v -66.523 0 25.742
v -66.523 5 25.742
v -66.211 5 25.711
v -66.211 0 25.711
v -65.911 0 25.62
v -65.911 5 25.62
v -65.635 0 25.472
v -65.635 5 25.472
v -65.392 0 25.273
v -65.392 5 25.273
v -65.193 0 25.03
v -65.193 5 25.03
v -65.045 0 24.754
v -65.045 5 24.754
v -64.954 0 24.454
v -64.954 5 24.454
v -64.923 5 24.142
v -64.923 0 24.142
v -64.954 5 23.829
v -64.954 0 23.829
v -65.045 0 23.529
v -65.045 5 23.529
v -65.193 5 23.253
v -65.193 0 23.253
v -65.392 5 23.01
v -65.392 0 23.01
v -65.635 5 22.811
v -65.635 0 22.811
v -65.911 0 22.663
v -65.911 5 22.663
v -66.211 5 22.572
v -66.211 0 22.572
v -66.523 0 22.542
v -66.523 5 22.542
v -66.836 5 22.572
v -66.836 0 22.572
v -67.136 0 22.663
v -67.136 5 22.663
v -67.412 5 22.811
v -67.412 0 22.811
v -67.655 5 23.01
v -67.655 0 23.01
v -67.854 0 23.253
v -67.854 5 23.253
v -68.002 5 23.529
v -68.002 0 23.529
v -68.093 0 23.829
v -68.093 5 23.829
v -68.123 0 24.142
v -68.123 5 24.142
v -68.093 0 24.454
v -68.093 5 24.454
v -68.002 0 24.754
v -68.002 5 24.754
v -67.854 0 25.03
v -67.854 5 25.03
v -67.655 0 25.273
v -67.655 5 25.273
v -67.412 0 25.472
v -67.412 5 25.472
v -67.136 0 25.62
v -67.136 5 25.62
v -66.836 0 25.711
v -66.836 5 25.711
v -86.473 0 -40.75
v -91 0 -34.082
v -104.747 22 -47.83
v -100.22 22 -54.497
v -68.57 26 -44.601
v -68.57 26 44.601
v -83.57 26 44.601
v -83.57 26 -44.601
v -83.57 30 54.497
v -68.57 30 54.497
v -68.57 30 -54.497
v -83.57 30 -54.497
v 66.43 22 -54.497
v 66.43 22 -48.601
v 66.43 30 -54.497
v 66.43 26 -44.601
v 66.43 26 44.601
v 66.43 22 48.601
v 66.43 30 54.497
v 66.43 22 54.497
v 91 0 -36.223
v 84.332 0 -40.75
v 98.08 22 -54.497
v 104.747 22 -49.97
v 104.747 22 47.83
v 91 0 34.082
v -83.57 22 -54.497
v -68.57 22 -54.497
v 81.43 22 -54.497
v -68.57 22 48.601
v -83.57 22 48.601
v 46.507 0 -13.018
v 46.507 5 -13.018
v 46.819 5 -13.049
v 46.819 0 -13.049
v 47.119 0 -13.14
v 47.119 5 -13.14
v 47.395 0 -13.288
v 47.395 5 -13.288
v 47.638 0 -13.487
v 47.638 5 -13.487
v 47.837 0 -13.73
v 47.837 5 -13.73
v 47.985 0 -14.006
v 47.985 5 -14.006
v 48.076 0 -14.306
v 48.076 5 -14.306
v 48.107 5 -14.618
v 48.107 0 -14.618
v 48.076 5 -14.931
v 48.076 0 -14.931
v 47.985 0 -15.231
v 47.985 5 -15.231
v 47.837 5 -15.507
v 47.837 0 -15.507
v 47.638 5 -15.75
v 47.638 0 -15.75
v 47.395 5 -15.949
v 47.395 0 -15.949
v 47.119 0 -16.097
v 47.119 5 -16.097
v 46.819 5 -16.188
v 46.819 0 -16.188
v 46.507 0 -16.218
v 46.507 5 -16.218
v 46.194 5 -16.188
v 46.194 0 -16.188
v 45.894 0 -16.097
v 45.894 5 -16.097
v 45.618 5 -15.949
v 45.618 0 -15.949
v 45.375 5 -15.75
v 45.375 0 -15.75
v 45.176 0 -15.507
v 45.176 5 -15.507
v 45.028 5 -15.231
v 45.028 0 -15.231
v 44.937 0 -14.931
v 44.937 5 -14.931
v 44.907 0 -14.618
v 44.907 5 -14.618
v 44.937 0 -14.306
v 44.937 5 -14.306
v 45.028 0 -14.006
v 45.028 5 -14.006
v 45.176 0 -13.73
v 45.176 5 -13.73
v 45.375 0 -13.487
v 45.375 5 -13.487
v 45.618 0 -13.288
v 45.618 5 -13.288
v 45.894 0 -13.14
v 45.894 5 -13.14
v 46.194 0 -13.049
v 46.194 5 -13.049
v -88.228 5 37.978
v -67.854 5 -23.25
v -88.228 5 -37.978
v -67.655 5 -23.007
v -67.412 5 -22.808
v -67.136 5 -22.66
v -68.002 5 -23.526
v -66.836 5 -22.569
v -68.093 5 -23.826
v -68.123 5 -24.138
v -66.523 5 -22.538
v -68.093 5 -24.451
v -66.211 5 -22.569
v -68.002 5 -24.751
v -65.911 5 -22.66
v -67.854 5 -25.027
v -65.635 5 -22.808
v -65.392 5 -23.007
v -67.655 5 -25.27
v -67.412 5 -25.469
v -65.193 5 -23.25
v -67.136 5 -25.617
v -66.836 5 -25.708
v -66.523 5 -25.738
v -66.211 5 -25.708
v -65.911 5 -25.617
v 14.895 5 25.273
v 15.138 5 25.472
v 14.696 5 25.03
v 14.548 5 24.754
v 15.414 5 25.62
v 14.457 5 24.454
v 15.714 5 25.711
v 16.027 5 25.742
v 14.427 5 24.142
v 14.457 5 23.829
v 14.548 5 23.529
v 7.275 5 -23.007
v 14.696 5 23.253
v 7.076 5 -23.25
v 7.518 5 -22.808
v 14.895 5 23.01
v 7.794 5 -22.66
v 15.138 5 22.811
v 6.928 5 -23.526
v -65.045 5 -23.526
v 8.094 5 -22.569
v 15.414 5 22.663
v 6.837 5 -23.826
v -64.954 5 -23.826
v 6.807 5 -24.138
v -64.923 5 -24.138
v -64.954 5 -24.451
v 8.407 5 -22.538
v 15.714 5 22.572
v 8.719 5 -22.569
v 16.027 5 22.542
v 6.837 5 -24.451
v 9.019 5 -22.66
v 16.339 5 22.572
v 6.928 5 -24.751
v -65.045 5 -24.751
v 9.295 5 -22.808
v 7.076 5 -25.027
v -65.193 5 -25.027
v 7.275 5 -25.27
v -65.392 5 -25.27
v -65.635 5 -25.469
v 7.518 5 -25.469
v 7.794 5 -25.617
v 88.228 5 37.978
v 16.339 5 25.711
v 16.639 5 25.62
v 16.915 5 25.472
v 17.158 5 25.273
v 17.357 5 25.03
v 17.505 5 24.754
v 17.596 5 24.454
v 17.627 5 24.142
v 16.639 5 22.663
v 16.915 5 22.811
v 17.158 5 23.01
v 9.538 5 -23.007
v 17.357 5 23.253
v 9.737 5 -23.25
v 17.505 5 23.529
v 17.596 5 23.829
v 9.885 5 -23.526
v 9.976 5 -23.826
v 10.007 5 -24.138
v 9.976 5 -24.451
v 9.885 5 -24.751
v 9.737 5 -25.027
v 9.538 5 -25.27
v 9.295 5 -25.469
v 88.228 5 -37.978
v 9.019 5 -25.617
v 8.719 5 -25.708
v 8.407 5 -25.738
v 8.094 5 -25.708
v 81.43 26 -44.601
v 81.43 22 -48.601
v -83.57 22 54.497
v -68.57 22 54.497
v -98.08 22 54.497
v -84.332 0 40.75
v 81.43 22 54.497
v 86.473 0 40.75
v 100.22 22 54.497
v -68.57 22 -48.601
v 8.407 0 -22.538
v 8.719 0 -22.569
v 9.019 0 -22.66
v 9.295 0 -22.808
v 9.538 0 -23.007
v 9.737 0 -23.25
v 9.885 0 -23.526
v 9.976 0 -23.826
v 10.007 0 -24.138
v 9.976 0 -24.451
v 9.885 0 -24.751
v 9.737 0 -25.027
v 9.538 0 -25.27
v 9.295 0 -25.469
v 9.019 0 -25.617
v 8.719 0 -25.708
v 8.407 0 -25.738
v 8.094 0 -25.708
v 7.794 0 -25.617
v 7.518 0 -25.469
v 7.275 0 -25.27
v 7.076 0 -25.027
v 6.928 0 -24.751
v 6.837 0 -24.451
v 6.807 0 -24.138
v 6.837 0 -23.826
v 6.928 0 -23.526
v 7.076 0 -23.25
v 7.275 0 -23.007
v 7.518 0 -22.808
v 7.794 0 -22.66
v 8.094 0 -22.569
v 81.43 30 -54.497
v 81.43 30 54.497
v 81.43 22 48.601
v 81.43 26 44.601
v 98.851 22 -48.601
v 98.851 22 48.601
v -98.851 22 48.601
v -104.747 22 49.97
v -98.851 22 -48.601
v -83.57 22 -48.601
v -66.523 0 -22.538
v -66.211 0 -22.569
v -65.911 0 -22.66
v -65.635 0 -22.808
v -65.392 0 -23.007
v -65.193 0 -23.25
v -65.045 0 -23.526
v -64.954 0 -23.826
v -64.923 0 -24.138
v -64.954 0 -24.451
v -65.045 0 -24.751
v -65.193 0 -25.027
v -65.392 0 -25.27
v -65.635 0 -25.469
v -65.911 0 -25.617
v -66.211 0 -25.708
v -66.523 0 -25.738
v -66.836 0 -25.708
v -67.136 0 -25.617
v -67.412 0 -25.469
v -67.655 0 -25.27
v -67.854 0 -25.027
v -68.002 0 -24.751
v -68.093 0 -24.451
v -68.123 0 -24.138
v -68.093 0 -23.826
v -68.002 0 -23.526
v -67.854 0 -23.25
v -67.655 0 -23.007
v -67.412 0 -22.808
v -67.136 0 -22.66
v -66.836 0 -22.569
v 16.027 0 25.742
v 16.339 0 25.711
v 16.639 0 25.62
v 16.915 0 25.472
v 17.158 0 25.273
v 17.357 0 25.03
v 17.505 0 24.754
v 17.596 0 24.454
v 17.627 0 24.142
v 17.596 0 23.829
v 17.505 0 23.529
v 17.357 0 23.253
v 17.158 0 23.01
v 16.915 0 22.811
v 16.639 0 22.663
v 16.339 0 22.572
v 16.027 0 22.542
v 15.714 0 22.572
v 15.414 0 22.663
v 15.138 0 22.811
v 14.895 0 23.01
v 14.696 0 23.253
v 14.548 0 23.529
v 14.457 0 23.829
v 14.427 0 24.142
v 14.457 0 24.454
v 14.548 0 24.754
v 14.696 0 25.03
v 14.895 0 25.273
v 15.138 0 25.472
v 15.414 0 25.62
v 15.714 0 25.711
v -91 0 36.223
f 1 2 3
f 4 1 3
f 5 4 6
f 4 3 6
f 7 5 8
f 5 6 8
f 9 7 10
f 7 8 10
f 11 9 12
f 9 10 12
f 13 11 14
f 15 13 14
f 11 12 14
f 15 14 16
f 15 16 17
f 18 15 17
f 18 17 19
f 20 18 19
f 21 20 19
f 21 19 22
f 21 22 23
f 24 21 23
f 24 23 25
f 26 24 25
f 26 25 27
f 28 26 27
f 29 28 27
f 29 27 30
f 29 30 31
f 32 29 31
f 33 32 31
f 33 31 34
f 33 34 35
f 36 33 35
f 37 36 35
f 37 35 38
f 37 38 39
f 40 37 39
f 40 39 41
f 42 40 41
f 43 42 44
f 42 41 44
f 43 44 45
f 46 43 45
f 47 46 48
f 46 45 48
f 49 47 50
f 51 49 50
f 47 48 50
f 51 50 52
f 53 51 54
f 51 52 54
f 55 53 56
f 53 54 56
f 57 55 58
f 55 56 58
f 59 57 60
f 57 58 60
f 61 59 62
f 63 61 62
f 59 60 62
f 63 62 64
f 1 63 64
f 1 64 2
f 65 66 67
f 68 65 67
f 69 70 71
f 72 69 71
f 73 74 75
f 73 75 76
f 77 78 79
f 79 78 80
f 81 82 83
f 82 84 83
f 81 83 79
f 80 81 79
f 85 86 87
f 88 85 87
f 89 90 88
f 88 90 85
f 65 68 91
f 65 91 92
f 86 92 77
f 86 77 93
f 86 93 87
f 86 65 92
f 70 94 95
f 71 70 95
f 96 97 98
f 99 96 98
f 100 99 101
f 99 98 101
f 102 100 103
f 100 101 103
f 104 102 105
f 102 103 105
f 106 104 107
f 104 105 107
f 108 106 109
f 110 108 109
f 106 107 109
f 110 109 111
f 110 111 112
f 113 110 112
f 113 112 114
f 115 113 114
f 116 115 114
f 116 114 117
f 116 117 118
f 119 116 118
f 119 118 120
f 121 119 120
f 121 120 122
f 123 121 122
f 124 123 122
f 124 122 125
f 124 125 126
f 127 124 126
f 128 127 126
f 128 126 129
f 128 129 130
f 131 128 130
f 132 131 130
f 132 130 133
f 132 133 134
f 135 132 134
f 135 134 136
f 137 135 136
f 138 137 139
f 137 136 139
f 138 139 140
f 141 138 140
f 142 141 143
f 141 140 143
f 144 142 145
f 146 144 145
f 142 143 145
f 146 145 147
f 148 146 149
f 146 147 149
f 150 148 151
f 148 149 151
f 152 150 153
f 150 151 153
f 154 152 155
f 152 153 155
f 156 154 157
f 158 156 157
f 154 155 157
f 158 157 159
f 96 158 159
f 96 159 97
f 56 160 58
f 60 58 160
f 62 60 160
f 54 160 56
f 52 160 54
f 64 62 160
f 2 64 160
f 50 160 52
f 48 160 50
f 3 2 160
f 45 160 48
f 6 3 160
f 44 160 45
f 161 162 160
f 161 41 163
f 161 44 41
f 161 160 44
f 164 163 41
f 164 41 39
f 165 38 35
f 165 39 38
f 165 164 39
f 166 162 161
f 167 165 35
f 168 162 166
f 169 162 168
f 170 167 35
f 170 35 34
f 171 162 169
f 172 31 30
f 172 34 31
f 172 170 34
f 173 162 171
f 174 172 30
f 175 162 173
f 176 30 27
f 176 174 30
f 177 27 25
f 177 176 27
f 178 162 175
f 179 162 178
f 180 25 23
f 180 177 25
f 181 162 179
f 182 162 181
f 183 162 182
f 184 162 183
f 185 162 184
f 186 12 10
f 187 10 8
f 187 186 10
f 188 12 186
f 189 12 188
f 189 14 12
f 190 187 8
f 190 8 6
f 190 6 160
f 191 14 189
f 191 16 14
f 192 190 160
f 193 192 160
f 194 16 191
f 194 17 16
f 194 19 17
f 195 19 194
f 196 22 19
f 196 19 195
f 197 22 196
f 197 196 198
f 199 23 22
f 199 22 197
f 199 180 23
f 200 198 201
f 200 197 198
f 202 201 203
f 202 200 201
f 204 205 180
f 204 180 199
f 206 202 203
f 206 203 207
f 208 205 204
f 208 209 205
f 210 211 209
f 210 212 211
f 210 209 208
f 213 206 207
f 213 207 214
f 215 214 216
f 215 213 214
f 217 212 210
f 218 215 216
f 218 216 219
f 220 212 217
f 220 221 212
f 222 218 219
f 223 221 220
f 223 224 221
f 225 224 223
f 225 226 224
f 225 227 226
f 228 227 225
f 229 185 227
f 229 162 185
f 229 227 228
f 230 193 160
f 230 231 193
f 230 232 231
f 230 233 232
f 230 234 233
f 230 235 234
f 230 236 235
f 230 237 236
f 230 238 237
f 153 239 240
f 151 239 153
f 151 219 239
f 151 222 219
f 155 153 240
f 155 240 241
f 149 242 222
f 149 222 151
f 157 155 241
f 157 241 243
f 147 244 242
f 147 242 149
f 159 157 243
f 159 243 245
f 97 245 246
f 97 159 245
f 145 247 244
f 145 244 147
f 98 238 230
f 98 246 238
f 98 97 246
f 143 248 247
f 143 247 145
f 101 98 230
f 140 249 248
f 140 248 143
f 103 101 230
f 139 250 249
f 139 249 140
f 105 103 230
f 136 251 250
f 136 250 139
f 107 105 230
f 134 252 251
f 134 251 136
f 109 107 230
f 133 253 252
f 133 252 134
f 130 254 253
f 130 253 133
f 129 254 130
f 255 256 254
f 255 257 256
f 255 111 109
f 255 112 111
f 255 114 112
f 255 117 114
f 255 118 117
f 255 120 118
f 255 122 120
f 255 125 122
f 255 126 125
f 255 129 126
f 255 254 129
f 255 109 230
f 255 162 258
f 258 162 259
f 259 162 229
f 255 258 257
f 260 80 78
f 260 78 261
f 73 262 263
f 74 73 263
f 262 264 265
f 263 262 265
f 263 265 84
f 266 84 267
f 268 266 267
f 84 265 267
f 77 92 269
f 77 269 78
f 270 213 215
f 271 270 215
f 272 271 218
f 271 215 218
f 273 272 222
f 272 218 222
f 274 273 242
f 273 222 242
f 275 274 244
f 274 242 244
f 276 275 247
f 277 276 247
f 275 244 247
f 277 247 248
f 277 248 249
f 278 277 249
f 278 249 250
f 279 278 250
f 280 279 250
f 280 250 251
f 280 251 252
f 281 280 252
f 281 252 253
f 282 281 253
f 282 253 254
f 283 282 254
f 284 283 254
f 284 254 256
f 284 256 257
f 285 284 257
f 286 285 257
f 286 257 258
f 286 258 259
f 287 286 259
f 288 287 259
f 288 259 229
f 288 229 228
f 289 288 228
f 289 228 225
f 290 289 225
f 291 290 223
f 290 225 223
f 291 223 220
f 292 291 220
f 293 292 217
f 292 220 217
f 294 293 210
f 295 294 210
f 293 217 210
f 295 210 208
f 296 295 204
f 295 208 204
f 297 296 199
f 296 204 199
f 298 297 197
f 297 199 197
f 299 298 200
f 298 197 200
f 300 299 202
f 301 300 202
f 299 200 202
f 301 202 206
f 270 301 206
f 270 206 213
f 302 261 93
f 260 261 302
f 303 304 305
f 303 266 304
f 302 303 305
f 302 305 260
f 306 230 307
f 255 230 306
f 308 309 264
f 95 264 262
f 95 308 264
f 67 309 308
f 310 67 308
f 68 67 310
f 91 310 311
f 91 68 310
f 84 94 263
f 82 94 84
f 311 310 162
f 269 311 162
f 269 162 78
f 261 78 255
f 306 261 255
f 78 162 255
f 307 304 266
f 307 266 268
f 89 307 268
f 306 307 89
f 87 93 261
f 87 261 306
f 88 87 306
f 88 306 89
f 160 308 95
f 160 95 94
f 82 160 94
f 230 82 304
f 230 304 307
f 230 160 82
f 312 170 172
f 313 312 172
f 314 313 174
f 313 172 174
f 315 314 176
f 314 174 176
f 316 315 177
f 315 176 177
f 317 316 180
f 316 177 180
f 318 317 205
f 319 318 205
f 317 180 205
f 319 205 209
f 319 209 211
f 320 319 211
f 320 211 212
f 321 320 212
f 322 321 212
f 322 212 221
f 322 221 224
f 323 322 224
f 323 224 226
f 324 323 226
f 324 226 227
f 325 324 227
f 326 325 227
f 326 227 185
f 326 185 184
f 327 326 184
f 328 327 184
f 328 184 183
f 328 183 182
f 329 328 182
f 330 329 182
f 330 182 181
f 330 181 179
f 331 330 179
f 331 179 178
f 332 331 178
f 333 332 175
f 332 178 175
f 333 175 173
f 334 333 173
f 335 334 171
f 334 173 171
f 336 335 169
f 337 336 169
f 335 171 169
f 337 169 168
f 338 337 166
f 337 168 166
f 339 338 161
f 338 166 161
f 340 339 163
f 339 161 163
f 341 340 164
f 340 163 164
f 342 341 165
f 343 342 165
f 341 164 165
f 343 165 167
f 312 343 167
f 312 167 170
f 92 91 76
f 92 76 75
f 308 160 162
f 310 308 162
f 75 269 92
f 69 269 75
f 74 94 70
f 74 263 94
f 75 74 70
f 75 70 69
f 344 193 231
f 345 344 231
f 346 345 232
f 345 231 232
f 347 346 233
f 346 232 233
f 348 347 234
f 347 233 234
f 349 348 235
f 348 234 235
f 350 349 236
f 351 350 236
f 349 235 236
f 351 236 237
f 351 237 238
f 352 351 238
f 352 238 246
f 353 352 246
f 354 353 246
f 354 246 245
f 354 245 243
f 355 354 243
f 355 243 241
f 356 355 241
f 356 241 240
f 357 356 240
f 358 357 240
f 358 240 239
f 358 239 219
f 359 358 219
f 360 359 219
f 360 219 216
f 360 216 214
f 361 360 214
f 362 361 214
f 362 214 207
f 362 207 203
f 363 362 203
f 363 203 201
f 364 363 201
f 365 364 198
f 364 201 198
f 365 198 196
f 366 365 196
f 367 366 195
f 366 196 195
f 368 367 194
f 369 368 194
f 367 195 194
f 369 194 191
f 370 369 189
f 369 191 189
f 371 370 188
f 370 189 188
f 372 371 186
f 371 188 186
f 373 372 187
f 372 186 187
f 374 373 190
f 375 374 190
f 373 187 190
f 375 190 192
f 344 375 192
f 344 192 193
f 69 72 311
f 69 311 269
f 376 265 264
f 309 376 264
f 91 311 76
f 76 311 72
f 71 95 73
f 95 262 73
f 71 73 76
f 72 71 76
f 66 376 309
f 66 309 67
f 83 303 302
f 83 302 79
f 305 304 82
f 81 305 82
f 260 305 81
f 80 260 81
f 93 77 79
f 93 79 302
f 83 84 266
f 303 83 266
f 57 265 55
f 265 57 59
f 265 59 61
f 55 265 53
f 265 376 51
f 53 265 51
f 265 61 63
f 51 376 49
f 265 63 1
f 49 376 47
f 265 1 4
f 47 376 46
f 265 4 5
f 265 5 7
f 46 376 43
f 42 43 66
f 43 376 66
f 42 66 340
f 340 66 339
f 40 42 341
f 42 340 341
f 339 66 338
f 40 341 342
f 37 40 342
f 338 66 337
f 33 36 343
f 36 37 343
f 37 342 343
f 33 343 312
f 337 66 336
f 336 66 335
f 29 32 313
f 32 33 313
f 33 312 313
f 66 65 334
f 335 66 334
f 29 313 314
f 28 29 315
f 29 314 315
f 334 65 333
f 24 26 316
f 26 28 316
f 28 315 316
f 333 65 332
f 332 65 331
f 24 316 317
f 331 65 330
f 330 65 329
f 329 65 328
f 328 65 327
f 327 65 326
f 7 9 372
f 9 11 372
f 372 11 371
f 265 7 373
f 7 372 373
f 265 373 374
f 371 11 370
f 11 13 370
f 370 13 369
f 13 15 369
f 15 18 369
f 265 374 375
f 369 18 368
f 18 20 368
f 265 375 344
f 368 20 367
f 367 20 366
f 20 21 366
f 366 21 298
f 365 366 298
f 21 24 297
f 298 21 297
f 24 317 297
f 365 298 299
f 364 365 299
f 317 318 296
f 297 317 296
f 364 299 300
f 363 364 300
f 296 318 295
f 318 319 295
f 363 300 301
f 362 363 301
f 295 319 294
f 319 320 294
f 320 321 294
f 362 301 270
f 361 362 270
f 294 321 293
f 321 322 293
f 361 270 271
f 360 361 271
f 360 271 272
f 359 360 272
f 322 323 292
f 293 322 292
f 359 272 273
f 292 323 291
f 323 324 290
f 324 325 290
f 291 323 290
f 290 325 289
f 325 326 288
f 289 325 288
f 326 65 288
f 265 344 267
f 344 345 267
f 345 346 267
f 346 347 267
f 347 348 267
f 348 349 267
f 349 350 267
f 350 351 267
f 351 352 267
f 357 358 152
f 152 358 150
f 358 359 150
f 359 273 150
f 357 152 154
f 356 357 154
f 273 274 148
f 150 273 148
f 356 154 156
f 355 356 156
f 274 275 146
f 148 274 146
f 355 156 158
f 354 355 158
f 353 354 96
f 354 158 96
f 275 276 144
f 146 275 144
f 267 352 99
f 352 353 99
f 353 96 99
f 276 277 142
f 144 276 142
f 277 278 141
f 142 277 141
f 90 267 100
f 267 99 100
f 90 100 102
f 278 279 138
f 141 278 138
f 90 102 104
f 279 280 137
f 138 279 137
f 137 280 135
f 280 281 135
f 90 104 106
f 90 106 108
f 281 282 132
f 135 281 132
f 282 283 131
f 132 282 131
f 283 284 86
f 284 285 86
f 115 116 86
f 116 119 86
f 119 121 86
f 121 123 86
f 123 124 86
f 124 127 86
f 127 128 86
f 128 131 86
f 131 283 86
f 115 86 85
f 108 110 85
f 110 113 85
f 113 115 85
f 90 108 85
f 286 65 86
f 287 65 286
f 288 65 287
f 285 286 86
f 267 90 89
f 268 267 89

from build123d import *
from OCP.BRepFilletAPI import BRepFilletAPI_MakeChamfer

# Parameters (mm, degrees)
SKETCH1_W           = 182
SKETCH1_H           = 81.5
BOSS_EXTRUDE1_DEPTH = 22
BOSS_EXTRUDE1_DRAFT = -32
SHELL1_T            = -5
SKETCH2_R           = 1.6
CUT_EXTRUDE1_DEPTH  = 22
CHAMFER1_SIZE       = 4
CHAMFER1_SIZE2      = 5.891470361
SKETCH3_W           = 15
SKETCH3_H           = 5.895892017
BOSS_EXTRUDE2_DEPTH = 8
SKETCH6_W           = 15
SKETCH6_H           = 4
BOSS_EXTRUDE3_DEPTH = 98
SKETCH7_W           = 15
SKETCH7_H           = 4
BOSS_EXTRUDE4_DEPTH = 98
CHAMFER2_SIZE       = 4


with BuildPart() as part:
    # Sketch1 → Boss-Extrude1 (with draft: the straight prism first)
    with BuildSketch(Plane(origin=(0, 0, 0), x_dir=(1, 0, 0), z_dir=(0, 1, 0))):
        Rectangle(SKETCH1_W, SKETCH1_H)
    extrude(amount=BOSS_EXTRUDE1_DEPTH)
    # Boss-Extrude1: the draft: its side faces are tilted about the plane it starts from
    boss_extrude1_sides = [part.faces().sort_by_distance(p)[0] for p in [
        (0, 11, 40.75),
        (91, 11, 0),
        (0, 11, -40.75),
        (-91, 11, 0),
    ]]
    draft(boss_extrude1_sides, Plane(origin=(0, 0, 0), x_dir=(1, 0, 0), z_dir=(0, 1, 0)), BOSS_EXTRUDE1_DRAFT)

    # Shell1
    shell1_openings = [part.faces().sort_by_distance(p)[0] for p in [
        (0, 22, 0),
    ]]
    offset(amount=SHELL1_T, openings=shell1_openings, kind=Kind.INTERSECTION)

    # Sketch2 → Cut-Extrude1 (cut)
    with BuildSketch(Plane(origin=(0, 5, 0), x_dir=(1, 0, 0), z_dir=(0, 1, 0))):
        with Locations(Location((-66.523454743, 24.138454743, 0), (0, 0, 270))):
            Circle(SKETCH2_R)
        with Locations(Location((-66.523454743, -24.141545257, 0), (0, 0, 270))):
            Circle(SKETCH2_R)
        with Locations(Location((8.406545257, 24.138454743, 0), (0, 0, 270))):
            Circle(SKETCH2_R)
        with Locations(Location((16.026545257, -24.141545257, 0), (0, 0, 270))):
            Circle(SKETCH2_R)
        with Locations(Location((46.506545257, 14.618454743, 0), (0, 0, 270))):
            Circle(SKETCH2_R)
    extrude(amount=-CUT_EXTRUDE1_DEPTH, mode=Mode.SUBTRACT)

    # Chamfer1: one chamfer whose edges measure the first distance from different faces: ONE call of the kernel's chamfer builder (chamfer() names one face for all edges)
    chamfer1_edges_1 = [part.edges().sort_by_distance(p)[0] for p in [
        (97.873562871, 11, 47.623562871),
    ]]
    chamfer1_side_1 = [part.faces().sort_by_distance(p)[0] for p in [
        (0, 11.257506349, 47.784470697),
    ]]
    chamfer1_edges_2 = [part.edges().sort_by_distance(p)[0] for p in [
        (-97.873562871, 11, 47.623562871),
    ]]
    chamfer1_side_2 = [part.faces().sort_by_distance(p)[0] for p in [
        (-98.204252581, 11.529214161, 0),
    ]]
    chamfer1_edges_3 = [part.edges().sort_by_distance(p)[0] for p in [
        (-97.873562871, 11, -47.623562871),
    ]]
    chamfer1_side_3 = [part.faces().sort_by_distance(p)[0] for p in [
        (0, 11.257506349, -47.784470697),
    ]]
    chamfer1_edges_4 = [part.edges().sort_by_distance(p)[0] for p in [
        (97.873562871, 11, -47.623562871),
    ]]
    chamfer1_side_4 = [part.faces().sort_by_distance(p)[0] for p in [
        (98.204252581, 11.529214161, 0),
    ]]
    chamfer1 = BRepFilletAPI_MakeChamfer(part.part.solid().wrapped)
    for e in chamfer1_edges_1:
        chamfer1.Add(CHAMFER1_SIZE, CHAMFER1_SIZE2, e.wrapped, chamfer1_side_1[0].wrapped)  # the first distance lies on this face
    for e in chamfer1_edges_2:
        chamfer1.Add(CHAMFER1_SIZE, CHAMFER1_SIZE2, e.wrapped, chamfer1_side_2[0].wrapped)  # the first distance lies on this face
    for e in chamfer1_edges_3:
        chamfer1.Add(CHAMFER1_SIZE, CHAMFER1_SIZE2, e.wrapped, chamfer1_side_3[0].wrapped)  # the first distance lies on this face
    for e in chamfer1_edges_4:
        chamfer1.Add(CHAMFER1_SIZE, CHAMFER1_SIZE2, e.wrapped, chamfer1_side_4[0].wrapped)  # the first distance lies on this face
    add(Compound.cast(chamfer1.Shape()), mode=Mode.REPLACE)

    # Sketch3 → Boss-Extrude2 (add)
    with BuildSketch(Plane(origin=(0, 22, 0), x_dir=(1, 0, 0), z_dir=(0, 1, 0))):
        with Locations((-76.070202855, 51.549179733)):
            Rectangle(SKETCH3_W, SKETCH3_H)
        with Locations((73.929797145, 51.549179733)):
            Rectangle(SKETCH3_W, SKETCH3_H)
        with Locations((-76.070202855, -51.549179733)):
            Rectangle(SKETCH3_W, SKETCH3_H)
        with Locations((73.929797145, -51.549179733)):
            Rectangle(SKETCH3_W, SKETCH3_H)
    extrude(amount=BOSS_EXTRUDE2_DEPTH)

    # Sketch6 → Boss-Extrude3 (add)
    with BuildSketch(Plane(origin=(0, 0, 48.601233725), x_dir=(-1, 0, 0), z_dir=(0, 0, -1))):
        with Locations((-73.929797145, 28)):
            Rectangle(SKETCH6_W, SKETCH6_H)
    extrude(amount=BOSS_EXTRUDE3_DEPTH)

    # Sketch7 → Boss-Extrude4 (add)
    with BuildSketch(Plane(origin=(0, 0, 48.601233725), x_dir=(-1, 0, 0), z_dir=(0, 0, -1))):
        with Locations((76.070202855, 28)):
            Rectangle(SKETCH7_W, SKETCH7_H)
    extrude(amount=BOSS_EXTRUDE4_DEPTH)

    # Chamfer2
    chamfer2_edges = [part.edges().sort_by_distance(p)[0] for p in [
        (-76.070202855, 26, 48.601233725),
        (-76.070202855, 26, -48.601233725),
        (73.929797145, 26, 48.601233725),
        (73.929797145, 26, -48.601233725),
    ]]
    chamfer(chamfer2_edges, length=CHAMFER2_SIZE - 0.0001)  # a hair under: the kernel refuses the full size


solid = part.part
